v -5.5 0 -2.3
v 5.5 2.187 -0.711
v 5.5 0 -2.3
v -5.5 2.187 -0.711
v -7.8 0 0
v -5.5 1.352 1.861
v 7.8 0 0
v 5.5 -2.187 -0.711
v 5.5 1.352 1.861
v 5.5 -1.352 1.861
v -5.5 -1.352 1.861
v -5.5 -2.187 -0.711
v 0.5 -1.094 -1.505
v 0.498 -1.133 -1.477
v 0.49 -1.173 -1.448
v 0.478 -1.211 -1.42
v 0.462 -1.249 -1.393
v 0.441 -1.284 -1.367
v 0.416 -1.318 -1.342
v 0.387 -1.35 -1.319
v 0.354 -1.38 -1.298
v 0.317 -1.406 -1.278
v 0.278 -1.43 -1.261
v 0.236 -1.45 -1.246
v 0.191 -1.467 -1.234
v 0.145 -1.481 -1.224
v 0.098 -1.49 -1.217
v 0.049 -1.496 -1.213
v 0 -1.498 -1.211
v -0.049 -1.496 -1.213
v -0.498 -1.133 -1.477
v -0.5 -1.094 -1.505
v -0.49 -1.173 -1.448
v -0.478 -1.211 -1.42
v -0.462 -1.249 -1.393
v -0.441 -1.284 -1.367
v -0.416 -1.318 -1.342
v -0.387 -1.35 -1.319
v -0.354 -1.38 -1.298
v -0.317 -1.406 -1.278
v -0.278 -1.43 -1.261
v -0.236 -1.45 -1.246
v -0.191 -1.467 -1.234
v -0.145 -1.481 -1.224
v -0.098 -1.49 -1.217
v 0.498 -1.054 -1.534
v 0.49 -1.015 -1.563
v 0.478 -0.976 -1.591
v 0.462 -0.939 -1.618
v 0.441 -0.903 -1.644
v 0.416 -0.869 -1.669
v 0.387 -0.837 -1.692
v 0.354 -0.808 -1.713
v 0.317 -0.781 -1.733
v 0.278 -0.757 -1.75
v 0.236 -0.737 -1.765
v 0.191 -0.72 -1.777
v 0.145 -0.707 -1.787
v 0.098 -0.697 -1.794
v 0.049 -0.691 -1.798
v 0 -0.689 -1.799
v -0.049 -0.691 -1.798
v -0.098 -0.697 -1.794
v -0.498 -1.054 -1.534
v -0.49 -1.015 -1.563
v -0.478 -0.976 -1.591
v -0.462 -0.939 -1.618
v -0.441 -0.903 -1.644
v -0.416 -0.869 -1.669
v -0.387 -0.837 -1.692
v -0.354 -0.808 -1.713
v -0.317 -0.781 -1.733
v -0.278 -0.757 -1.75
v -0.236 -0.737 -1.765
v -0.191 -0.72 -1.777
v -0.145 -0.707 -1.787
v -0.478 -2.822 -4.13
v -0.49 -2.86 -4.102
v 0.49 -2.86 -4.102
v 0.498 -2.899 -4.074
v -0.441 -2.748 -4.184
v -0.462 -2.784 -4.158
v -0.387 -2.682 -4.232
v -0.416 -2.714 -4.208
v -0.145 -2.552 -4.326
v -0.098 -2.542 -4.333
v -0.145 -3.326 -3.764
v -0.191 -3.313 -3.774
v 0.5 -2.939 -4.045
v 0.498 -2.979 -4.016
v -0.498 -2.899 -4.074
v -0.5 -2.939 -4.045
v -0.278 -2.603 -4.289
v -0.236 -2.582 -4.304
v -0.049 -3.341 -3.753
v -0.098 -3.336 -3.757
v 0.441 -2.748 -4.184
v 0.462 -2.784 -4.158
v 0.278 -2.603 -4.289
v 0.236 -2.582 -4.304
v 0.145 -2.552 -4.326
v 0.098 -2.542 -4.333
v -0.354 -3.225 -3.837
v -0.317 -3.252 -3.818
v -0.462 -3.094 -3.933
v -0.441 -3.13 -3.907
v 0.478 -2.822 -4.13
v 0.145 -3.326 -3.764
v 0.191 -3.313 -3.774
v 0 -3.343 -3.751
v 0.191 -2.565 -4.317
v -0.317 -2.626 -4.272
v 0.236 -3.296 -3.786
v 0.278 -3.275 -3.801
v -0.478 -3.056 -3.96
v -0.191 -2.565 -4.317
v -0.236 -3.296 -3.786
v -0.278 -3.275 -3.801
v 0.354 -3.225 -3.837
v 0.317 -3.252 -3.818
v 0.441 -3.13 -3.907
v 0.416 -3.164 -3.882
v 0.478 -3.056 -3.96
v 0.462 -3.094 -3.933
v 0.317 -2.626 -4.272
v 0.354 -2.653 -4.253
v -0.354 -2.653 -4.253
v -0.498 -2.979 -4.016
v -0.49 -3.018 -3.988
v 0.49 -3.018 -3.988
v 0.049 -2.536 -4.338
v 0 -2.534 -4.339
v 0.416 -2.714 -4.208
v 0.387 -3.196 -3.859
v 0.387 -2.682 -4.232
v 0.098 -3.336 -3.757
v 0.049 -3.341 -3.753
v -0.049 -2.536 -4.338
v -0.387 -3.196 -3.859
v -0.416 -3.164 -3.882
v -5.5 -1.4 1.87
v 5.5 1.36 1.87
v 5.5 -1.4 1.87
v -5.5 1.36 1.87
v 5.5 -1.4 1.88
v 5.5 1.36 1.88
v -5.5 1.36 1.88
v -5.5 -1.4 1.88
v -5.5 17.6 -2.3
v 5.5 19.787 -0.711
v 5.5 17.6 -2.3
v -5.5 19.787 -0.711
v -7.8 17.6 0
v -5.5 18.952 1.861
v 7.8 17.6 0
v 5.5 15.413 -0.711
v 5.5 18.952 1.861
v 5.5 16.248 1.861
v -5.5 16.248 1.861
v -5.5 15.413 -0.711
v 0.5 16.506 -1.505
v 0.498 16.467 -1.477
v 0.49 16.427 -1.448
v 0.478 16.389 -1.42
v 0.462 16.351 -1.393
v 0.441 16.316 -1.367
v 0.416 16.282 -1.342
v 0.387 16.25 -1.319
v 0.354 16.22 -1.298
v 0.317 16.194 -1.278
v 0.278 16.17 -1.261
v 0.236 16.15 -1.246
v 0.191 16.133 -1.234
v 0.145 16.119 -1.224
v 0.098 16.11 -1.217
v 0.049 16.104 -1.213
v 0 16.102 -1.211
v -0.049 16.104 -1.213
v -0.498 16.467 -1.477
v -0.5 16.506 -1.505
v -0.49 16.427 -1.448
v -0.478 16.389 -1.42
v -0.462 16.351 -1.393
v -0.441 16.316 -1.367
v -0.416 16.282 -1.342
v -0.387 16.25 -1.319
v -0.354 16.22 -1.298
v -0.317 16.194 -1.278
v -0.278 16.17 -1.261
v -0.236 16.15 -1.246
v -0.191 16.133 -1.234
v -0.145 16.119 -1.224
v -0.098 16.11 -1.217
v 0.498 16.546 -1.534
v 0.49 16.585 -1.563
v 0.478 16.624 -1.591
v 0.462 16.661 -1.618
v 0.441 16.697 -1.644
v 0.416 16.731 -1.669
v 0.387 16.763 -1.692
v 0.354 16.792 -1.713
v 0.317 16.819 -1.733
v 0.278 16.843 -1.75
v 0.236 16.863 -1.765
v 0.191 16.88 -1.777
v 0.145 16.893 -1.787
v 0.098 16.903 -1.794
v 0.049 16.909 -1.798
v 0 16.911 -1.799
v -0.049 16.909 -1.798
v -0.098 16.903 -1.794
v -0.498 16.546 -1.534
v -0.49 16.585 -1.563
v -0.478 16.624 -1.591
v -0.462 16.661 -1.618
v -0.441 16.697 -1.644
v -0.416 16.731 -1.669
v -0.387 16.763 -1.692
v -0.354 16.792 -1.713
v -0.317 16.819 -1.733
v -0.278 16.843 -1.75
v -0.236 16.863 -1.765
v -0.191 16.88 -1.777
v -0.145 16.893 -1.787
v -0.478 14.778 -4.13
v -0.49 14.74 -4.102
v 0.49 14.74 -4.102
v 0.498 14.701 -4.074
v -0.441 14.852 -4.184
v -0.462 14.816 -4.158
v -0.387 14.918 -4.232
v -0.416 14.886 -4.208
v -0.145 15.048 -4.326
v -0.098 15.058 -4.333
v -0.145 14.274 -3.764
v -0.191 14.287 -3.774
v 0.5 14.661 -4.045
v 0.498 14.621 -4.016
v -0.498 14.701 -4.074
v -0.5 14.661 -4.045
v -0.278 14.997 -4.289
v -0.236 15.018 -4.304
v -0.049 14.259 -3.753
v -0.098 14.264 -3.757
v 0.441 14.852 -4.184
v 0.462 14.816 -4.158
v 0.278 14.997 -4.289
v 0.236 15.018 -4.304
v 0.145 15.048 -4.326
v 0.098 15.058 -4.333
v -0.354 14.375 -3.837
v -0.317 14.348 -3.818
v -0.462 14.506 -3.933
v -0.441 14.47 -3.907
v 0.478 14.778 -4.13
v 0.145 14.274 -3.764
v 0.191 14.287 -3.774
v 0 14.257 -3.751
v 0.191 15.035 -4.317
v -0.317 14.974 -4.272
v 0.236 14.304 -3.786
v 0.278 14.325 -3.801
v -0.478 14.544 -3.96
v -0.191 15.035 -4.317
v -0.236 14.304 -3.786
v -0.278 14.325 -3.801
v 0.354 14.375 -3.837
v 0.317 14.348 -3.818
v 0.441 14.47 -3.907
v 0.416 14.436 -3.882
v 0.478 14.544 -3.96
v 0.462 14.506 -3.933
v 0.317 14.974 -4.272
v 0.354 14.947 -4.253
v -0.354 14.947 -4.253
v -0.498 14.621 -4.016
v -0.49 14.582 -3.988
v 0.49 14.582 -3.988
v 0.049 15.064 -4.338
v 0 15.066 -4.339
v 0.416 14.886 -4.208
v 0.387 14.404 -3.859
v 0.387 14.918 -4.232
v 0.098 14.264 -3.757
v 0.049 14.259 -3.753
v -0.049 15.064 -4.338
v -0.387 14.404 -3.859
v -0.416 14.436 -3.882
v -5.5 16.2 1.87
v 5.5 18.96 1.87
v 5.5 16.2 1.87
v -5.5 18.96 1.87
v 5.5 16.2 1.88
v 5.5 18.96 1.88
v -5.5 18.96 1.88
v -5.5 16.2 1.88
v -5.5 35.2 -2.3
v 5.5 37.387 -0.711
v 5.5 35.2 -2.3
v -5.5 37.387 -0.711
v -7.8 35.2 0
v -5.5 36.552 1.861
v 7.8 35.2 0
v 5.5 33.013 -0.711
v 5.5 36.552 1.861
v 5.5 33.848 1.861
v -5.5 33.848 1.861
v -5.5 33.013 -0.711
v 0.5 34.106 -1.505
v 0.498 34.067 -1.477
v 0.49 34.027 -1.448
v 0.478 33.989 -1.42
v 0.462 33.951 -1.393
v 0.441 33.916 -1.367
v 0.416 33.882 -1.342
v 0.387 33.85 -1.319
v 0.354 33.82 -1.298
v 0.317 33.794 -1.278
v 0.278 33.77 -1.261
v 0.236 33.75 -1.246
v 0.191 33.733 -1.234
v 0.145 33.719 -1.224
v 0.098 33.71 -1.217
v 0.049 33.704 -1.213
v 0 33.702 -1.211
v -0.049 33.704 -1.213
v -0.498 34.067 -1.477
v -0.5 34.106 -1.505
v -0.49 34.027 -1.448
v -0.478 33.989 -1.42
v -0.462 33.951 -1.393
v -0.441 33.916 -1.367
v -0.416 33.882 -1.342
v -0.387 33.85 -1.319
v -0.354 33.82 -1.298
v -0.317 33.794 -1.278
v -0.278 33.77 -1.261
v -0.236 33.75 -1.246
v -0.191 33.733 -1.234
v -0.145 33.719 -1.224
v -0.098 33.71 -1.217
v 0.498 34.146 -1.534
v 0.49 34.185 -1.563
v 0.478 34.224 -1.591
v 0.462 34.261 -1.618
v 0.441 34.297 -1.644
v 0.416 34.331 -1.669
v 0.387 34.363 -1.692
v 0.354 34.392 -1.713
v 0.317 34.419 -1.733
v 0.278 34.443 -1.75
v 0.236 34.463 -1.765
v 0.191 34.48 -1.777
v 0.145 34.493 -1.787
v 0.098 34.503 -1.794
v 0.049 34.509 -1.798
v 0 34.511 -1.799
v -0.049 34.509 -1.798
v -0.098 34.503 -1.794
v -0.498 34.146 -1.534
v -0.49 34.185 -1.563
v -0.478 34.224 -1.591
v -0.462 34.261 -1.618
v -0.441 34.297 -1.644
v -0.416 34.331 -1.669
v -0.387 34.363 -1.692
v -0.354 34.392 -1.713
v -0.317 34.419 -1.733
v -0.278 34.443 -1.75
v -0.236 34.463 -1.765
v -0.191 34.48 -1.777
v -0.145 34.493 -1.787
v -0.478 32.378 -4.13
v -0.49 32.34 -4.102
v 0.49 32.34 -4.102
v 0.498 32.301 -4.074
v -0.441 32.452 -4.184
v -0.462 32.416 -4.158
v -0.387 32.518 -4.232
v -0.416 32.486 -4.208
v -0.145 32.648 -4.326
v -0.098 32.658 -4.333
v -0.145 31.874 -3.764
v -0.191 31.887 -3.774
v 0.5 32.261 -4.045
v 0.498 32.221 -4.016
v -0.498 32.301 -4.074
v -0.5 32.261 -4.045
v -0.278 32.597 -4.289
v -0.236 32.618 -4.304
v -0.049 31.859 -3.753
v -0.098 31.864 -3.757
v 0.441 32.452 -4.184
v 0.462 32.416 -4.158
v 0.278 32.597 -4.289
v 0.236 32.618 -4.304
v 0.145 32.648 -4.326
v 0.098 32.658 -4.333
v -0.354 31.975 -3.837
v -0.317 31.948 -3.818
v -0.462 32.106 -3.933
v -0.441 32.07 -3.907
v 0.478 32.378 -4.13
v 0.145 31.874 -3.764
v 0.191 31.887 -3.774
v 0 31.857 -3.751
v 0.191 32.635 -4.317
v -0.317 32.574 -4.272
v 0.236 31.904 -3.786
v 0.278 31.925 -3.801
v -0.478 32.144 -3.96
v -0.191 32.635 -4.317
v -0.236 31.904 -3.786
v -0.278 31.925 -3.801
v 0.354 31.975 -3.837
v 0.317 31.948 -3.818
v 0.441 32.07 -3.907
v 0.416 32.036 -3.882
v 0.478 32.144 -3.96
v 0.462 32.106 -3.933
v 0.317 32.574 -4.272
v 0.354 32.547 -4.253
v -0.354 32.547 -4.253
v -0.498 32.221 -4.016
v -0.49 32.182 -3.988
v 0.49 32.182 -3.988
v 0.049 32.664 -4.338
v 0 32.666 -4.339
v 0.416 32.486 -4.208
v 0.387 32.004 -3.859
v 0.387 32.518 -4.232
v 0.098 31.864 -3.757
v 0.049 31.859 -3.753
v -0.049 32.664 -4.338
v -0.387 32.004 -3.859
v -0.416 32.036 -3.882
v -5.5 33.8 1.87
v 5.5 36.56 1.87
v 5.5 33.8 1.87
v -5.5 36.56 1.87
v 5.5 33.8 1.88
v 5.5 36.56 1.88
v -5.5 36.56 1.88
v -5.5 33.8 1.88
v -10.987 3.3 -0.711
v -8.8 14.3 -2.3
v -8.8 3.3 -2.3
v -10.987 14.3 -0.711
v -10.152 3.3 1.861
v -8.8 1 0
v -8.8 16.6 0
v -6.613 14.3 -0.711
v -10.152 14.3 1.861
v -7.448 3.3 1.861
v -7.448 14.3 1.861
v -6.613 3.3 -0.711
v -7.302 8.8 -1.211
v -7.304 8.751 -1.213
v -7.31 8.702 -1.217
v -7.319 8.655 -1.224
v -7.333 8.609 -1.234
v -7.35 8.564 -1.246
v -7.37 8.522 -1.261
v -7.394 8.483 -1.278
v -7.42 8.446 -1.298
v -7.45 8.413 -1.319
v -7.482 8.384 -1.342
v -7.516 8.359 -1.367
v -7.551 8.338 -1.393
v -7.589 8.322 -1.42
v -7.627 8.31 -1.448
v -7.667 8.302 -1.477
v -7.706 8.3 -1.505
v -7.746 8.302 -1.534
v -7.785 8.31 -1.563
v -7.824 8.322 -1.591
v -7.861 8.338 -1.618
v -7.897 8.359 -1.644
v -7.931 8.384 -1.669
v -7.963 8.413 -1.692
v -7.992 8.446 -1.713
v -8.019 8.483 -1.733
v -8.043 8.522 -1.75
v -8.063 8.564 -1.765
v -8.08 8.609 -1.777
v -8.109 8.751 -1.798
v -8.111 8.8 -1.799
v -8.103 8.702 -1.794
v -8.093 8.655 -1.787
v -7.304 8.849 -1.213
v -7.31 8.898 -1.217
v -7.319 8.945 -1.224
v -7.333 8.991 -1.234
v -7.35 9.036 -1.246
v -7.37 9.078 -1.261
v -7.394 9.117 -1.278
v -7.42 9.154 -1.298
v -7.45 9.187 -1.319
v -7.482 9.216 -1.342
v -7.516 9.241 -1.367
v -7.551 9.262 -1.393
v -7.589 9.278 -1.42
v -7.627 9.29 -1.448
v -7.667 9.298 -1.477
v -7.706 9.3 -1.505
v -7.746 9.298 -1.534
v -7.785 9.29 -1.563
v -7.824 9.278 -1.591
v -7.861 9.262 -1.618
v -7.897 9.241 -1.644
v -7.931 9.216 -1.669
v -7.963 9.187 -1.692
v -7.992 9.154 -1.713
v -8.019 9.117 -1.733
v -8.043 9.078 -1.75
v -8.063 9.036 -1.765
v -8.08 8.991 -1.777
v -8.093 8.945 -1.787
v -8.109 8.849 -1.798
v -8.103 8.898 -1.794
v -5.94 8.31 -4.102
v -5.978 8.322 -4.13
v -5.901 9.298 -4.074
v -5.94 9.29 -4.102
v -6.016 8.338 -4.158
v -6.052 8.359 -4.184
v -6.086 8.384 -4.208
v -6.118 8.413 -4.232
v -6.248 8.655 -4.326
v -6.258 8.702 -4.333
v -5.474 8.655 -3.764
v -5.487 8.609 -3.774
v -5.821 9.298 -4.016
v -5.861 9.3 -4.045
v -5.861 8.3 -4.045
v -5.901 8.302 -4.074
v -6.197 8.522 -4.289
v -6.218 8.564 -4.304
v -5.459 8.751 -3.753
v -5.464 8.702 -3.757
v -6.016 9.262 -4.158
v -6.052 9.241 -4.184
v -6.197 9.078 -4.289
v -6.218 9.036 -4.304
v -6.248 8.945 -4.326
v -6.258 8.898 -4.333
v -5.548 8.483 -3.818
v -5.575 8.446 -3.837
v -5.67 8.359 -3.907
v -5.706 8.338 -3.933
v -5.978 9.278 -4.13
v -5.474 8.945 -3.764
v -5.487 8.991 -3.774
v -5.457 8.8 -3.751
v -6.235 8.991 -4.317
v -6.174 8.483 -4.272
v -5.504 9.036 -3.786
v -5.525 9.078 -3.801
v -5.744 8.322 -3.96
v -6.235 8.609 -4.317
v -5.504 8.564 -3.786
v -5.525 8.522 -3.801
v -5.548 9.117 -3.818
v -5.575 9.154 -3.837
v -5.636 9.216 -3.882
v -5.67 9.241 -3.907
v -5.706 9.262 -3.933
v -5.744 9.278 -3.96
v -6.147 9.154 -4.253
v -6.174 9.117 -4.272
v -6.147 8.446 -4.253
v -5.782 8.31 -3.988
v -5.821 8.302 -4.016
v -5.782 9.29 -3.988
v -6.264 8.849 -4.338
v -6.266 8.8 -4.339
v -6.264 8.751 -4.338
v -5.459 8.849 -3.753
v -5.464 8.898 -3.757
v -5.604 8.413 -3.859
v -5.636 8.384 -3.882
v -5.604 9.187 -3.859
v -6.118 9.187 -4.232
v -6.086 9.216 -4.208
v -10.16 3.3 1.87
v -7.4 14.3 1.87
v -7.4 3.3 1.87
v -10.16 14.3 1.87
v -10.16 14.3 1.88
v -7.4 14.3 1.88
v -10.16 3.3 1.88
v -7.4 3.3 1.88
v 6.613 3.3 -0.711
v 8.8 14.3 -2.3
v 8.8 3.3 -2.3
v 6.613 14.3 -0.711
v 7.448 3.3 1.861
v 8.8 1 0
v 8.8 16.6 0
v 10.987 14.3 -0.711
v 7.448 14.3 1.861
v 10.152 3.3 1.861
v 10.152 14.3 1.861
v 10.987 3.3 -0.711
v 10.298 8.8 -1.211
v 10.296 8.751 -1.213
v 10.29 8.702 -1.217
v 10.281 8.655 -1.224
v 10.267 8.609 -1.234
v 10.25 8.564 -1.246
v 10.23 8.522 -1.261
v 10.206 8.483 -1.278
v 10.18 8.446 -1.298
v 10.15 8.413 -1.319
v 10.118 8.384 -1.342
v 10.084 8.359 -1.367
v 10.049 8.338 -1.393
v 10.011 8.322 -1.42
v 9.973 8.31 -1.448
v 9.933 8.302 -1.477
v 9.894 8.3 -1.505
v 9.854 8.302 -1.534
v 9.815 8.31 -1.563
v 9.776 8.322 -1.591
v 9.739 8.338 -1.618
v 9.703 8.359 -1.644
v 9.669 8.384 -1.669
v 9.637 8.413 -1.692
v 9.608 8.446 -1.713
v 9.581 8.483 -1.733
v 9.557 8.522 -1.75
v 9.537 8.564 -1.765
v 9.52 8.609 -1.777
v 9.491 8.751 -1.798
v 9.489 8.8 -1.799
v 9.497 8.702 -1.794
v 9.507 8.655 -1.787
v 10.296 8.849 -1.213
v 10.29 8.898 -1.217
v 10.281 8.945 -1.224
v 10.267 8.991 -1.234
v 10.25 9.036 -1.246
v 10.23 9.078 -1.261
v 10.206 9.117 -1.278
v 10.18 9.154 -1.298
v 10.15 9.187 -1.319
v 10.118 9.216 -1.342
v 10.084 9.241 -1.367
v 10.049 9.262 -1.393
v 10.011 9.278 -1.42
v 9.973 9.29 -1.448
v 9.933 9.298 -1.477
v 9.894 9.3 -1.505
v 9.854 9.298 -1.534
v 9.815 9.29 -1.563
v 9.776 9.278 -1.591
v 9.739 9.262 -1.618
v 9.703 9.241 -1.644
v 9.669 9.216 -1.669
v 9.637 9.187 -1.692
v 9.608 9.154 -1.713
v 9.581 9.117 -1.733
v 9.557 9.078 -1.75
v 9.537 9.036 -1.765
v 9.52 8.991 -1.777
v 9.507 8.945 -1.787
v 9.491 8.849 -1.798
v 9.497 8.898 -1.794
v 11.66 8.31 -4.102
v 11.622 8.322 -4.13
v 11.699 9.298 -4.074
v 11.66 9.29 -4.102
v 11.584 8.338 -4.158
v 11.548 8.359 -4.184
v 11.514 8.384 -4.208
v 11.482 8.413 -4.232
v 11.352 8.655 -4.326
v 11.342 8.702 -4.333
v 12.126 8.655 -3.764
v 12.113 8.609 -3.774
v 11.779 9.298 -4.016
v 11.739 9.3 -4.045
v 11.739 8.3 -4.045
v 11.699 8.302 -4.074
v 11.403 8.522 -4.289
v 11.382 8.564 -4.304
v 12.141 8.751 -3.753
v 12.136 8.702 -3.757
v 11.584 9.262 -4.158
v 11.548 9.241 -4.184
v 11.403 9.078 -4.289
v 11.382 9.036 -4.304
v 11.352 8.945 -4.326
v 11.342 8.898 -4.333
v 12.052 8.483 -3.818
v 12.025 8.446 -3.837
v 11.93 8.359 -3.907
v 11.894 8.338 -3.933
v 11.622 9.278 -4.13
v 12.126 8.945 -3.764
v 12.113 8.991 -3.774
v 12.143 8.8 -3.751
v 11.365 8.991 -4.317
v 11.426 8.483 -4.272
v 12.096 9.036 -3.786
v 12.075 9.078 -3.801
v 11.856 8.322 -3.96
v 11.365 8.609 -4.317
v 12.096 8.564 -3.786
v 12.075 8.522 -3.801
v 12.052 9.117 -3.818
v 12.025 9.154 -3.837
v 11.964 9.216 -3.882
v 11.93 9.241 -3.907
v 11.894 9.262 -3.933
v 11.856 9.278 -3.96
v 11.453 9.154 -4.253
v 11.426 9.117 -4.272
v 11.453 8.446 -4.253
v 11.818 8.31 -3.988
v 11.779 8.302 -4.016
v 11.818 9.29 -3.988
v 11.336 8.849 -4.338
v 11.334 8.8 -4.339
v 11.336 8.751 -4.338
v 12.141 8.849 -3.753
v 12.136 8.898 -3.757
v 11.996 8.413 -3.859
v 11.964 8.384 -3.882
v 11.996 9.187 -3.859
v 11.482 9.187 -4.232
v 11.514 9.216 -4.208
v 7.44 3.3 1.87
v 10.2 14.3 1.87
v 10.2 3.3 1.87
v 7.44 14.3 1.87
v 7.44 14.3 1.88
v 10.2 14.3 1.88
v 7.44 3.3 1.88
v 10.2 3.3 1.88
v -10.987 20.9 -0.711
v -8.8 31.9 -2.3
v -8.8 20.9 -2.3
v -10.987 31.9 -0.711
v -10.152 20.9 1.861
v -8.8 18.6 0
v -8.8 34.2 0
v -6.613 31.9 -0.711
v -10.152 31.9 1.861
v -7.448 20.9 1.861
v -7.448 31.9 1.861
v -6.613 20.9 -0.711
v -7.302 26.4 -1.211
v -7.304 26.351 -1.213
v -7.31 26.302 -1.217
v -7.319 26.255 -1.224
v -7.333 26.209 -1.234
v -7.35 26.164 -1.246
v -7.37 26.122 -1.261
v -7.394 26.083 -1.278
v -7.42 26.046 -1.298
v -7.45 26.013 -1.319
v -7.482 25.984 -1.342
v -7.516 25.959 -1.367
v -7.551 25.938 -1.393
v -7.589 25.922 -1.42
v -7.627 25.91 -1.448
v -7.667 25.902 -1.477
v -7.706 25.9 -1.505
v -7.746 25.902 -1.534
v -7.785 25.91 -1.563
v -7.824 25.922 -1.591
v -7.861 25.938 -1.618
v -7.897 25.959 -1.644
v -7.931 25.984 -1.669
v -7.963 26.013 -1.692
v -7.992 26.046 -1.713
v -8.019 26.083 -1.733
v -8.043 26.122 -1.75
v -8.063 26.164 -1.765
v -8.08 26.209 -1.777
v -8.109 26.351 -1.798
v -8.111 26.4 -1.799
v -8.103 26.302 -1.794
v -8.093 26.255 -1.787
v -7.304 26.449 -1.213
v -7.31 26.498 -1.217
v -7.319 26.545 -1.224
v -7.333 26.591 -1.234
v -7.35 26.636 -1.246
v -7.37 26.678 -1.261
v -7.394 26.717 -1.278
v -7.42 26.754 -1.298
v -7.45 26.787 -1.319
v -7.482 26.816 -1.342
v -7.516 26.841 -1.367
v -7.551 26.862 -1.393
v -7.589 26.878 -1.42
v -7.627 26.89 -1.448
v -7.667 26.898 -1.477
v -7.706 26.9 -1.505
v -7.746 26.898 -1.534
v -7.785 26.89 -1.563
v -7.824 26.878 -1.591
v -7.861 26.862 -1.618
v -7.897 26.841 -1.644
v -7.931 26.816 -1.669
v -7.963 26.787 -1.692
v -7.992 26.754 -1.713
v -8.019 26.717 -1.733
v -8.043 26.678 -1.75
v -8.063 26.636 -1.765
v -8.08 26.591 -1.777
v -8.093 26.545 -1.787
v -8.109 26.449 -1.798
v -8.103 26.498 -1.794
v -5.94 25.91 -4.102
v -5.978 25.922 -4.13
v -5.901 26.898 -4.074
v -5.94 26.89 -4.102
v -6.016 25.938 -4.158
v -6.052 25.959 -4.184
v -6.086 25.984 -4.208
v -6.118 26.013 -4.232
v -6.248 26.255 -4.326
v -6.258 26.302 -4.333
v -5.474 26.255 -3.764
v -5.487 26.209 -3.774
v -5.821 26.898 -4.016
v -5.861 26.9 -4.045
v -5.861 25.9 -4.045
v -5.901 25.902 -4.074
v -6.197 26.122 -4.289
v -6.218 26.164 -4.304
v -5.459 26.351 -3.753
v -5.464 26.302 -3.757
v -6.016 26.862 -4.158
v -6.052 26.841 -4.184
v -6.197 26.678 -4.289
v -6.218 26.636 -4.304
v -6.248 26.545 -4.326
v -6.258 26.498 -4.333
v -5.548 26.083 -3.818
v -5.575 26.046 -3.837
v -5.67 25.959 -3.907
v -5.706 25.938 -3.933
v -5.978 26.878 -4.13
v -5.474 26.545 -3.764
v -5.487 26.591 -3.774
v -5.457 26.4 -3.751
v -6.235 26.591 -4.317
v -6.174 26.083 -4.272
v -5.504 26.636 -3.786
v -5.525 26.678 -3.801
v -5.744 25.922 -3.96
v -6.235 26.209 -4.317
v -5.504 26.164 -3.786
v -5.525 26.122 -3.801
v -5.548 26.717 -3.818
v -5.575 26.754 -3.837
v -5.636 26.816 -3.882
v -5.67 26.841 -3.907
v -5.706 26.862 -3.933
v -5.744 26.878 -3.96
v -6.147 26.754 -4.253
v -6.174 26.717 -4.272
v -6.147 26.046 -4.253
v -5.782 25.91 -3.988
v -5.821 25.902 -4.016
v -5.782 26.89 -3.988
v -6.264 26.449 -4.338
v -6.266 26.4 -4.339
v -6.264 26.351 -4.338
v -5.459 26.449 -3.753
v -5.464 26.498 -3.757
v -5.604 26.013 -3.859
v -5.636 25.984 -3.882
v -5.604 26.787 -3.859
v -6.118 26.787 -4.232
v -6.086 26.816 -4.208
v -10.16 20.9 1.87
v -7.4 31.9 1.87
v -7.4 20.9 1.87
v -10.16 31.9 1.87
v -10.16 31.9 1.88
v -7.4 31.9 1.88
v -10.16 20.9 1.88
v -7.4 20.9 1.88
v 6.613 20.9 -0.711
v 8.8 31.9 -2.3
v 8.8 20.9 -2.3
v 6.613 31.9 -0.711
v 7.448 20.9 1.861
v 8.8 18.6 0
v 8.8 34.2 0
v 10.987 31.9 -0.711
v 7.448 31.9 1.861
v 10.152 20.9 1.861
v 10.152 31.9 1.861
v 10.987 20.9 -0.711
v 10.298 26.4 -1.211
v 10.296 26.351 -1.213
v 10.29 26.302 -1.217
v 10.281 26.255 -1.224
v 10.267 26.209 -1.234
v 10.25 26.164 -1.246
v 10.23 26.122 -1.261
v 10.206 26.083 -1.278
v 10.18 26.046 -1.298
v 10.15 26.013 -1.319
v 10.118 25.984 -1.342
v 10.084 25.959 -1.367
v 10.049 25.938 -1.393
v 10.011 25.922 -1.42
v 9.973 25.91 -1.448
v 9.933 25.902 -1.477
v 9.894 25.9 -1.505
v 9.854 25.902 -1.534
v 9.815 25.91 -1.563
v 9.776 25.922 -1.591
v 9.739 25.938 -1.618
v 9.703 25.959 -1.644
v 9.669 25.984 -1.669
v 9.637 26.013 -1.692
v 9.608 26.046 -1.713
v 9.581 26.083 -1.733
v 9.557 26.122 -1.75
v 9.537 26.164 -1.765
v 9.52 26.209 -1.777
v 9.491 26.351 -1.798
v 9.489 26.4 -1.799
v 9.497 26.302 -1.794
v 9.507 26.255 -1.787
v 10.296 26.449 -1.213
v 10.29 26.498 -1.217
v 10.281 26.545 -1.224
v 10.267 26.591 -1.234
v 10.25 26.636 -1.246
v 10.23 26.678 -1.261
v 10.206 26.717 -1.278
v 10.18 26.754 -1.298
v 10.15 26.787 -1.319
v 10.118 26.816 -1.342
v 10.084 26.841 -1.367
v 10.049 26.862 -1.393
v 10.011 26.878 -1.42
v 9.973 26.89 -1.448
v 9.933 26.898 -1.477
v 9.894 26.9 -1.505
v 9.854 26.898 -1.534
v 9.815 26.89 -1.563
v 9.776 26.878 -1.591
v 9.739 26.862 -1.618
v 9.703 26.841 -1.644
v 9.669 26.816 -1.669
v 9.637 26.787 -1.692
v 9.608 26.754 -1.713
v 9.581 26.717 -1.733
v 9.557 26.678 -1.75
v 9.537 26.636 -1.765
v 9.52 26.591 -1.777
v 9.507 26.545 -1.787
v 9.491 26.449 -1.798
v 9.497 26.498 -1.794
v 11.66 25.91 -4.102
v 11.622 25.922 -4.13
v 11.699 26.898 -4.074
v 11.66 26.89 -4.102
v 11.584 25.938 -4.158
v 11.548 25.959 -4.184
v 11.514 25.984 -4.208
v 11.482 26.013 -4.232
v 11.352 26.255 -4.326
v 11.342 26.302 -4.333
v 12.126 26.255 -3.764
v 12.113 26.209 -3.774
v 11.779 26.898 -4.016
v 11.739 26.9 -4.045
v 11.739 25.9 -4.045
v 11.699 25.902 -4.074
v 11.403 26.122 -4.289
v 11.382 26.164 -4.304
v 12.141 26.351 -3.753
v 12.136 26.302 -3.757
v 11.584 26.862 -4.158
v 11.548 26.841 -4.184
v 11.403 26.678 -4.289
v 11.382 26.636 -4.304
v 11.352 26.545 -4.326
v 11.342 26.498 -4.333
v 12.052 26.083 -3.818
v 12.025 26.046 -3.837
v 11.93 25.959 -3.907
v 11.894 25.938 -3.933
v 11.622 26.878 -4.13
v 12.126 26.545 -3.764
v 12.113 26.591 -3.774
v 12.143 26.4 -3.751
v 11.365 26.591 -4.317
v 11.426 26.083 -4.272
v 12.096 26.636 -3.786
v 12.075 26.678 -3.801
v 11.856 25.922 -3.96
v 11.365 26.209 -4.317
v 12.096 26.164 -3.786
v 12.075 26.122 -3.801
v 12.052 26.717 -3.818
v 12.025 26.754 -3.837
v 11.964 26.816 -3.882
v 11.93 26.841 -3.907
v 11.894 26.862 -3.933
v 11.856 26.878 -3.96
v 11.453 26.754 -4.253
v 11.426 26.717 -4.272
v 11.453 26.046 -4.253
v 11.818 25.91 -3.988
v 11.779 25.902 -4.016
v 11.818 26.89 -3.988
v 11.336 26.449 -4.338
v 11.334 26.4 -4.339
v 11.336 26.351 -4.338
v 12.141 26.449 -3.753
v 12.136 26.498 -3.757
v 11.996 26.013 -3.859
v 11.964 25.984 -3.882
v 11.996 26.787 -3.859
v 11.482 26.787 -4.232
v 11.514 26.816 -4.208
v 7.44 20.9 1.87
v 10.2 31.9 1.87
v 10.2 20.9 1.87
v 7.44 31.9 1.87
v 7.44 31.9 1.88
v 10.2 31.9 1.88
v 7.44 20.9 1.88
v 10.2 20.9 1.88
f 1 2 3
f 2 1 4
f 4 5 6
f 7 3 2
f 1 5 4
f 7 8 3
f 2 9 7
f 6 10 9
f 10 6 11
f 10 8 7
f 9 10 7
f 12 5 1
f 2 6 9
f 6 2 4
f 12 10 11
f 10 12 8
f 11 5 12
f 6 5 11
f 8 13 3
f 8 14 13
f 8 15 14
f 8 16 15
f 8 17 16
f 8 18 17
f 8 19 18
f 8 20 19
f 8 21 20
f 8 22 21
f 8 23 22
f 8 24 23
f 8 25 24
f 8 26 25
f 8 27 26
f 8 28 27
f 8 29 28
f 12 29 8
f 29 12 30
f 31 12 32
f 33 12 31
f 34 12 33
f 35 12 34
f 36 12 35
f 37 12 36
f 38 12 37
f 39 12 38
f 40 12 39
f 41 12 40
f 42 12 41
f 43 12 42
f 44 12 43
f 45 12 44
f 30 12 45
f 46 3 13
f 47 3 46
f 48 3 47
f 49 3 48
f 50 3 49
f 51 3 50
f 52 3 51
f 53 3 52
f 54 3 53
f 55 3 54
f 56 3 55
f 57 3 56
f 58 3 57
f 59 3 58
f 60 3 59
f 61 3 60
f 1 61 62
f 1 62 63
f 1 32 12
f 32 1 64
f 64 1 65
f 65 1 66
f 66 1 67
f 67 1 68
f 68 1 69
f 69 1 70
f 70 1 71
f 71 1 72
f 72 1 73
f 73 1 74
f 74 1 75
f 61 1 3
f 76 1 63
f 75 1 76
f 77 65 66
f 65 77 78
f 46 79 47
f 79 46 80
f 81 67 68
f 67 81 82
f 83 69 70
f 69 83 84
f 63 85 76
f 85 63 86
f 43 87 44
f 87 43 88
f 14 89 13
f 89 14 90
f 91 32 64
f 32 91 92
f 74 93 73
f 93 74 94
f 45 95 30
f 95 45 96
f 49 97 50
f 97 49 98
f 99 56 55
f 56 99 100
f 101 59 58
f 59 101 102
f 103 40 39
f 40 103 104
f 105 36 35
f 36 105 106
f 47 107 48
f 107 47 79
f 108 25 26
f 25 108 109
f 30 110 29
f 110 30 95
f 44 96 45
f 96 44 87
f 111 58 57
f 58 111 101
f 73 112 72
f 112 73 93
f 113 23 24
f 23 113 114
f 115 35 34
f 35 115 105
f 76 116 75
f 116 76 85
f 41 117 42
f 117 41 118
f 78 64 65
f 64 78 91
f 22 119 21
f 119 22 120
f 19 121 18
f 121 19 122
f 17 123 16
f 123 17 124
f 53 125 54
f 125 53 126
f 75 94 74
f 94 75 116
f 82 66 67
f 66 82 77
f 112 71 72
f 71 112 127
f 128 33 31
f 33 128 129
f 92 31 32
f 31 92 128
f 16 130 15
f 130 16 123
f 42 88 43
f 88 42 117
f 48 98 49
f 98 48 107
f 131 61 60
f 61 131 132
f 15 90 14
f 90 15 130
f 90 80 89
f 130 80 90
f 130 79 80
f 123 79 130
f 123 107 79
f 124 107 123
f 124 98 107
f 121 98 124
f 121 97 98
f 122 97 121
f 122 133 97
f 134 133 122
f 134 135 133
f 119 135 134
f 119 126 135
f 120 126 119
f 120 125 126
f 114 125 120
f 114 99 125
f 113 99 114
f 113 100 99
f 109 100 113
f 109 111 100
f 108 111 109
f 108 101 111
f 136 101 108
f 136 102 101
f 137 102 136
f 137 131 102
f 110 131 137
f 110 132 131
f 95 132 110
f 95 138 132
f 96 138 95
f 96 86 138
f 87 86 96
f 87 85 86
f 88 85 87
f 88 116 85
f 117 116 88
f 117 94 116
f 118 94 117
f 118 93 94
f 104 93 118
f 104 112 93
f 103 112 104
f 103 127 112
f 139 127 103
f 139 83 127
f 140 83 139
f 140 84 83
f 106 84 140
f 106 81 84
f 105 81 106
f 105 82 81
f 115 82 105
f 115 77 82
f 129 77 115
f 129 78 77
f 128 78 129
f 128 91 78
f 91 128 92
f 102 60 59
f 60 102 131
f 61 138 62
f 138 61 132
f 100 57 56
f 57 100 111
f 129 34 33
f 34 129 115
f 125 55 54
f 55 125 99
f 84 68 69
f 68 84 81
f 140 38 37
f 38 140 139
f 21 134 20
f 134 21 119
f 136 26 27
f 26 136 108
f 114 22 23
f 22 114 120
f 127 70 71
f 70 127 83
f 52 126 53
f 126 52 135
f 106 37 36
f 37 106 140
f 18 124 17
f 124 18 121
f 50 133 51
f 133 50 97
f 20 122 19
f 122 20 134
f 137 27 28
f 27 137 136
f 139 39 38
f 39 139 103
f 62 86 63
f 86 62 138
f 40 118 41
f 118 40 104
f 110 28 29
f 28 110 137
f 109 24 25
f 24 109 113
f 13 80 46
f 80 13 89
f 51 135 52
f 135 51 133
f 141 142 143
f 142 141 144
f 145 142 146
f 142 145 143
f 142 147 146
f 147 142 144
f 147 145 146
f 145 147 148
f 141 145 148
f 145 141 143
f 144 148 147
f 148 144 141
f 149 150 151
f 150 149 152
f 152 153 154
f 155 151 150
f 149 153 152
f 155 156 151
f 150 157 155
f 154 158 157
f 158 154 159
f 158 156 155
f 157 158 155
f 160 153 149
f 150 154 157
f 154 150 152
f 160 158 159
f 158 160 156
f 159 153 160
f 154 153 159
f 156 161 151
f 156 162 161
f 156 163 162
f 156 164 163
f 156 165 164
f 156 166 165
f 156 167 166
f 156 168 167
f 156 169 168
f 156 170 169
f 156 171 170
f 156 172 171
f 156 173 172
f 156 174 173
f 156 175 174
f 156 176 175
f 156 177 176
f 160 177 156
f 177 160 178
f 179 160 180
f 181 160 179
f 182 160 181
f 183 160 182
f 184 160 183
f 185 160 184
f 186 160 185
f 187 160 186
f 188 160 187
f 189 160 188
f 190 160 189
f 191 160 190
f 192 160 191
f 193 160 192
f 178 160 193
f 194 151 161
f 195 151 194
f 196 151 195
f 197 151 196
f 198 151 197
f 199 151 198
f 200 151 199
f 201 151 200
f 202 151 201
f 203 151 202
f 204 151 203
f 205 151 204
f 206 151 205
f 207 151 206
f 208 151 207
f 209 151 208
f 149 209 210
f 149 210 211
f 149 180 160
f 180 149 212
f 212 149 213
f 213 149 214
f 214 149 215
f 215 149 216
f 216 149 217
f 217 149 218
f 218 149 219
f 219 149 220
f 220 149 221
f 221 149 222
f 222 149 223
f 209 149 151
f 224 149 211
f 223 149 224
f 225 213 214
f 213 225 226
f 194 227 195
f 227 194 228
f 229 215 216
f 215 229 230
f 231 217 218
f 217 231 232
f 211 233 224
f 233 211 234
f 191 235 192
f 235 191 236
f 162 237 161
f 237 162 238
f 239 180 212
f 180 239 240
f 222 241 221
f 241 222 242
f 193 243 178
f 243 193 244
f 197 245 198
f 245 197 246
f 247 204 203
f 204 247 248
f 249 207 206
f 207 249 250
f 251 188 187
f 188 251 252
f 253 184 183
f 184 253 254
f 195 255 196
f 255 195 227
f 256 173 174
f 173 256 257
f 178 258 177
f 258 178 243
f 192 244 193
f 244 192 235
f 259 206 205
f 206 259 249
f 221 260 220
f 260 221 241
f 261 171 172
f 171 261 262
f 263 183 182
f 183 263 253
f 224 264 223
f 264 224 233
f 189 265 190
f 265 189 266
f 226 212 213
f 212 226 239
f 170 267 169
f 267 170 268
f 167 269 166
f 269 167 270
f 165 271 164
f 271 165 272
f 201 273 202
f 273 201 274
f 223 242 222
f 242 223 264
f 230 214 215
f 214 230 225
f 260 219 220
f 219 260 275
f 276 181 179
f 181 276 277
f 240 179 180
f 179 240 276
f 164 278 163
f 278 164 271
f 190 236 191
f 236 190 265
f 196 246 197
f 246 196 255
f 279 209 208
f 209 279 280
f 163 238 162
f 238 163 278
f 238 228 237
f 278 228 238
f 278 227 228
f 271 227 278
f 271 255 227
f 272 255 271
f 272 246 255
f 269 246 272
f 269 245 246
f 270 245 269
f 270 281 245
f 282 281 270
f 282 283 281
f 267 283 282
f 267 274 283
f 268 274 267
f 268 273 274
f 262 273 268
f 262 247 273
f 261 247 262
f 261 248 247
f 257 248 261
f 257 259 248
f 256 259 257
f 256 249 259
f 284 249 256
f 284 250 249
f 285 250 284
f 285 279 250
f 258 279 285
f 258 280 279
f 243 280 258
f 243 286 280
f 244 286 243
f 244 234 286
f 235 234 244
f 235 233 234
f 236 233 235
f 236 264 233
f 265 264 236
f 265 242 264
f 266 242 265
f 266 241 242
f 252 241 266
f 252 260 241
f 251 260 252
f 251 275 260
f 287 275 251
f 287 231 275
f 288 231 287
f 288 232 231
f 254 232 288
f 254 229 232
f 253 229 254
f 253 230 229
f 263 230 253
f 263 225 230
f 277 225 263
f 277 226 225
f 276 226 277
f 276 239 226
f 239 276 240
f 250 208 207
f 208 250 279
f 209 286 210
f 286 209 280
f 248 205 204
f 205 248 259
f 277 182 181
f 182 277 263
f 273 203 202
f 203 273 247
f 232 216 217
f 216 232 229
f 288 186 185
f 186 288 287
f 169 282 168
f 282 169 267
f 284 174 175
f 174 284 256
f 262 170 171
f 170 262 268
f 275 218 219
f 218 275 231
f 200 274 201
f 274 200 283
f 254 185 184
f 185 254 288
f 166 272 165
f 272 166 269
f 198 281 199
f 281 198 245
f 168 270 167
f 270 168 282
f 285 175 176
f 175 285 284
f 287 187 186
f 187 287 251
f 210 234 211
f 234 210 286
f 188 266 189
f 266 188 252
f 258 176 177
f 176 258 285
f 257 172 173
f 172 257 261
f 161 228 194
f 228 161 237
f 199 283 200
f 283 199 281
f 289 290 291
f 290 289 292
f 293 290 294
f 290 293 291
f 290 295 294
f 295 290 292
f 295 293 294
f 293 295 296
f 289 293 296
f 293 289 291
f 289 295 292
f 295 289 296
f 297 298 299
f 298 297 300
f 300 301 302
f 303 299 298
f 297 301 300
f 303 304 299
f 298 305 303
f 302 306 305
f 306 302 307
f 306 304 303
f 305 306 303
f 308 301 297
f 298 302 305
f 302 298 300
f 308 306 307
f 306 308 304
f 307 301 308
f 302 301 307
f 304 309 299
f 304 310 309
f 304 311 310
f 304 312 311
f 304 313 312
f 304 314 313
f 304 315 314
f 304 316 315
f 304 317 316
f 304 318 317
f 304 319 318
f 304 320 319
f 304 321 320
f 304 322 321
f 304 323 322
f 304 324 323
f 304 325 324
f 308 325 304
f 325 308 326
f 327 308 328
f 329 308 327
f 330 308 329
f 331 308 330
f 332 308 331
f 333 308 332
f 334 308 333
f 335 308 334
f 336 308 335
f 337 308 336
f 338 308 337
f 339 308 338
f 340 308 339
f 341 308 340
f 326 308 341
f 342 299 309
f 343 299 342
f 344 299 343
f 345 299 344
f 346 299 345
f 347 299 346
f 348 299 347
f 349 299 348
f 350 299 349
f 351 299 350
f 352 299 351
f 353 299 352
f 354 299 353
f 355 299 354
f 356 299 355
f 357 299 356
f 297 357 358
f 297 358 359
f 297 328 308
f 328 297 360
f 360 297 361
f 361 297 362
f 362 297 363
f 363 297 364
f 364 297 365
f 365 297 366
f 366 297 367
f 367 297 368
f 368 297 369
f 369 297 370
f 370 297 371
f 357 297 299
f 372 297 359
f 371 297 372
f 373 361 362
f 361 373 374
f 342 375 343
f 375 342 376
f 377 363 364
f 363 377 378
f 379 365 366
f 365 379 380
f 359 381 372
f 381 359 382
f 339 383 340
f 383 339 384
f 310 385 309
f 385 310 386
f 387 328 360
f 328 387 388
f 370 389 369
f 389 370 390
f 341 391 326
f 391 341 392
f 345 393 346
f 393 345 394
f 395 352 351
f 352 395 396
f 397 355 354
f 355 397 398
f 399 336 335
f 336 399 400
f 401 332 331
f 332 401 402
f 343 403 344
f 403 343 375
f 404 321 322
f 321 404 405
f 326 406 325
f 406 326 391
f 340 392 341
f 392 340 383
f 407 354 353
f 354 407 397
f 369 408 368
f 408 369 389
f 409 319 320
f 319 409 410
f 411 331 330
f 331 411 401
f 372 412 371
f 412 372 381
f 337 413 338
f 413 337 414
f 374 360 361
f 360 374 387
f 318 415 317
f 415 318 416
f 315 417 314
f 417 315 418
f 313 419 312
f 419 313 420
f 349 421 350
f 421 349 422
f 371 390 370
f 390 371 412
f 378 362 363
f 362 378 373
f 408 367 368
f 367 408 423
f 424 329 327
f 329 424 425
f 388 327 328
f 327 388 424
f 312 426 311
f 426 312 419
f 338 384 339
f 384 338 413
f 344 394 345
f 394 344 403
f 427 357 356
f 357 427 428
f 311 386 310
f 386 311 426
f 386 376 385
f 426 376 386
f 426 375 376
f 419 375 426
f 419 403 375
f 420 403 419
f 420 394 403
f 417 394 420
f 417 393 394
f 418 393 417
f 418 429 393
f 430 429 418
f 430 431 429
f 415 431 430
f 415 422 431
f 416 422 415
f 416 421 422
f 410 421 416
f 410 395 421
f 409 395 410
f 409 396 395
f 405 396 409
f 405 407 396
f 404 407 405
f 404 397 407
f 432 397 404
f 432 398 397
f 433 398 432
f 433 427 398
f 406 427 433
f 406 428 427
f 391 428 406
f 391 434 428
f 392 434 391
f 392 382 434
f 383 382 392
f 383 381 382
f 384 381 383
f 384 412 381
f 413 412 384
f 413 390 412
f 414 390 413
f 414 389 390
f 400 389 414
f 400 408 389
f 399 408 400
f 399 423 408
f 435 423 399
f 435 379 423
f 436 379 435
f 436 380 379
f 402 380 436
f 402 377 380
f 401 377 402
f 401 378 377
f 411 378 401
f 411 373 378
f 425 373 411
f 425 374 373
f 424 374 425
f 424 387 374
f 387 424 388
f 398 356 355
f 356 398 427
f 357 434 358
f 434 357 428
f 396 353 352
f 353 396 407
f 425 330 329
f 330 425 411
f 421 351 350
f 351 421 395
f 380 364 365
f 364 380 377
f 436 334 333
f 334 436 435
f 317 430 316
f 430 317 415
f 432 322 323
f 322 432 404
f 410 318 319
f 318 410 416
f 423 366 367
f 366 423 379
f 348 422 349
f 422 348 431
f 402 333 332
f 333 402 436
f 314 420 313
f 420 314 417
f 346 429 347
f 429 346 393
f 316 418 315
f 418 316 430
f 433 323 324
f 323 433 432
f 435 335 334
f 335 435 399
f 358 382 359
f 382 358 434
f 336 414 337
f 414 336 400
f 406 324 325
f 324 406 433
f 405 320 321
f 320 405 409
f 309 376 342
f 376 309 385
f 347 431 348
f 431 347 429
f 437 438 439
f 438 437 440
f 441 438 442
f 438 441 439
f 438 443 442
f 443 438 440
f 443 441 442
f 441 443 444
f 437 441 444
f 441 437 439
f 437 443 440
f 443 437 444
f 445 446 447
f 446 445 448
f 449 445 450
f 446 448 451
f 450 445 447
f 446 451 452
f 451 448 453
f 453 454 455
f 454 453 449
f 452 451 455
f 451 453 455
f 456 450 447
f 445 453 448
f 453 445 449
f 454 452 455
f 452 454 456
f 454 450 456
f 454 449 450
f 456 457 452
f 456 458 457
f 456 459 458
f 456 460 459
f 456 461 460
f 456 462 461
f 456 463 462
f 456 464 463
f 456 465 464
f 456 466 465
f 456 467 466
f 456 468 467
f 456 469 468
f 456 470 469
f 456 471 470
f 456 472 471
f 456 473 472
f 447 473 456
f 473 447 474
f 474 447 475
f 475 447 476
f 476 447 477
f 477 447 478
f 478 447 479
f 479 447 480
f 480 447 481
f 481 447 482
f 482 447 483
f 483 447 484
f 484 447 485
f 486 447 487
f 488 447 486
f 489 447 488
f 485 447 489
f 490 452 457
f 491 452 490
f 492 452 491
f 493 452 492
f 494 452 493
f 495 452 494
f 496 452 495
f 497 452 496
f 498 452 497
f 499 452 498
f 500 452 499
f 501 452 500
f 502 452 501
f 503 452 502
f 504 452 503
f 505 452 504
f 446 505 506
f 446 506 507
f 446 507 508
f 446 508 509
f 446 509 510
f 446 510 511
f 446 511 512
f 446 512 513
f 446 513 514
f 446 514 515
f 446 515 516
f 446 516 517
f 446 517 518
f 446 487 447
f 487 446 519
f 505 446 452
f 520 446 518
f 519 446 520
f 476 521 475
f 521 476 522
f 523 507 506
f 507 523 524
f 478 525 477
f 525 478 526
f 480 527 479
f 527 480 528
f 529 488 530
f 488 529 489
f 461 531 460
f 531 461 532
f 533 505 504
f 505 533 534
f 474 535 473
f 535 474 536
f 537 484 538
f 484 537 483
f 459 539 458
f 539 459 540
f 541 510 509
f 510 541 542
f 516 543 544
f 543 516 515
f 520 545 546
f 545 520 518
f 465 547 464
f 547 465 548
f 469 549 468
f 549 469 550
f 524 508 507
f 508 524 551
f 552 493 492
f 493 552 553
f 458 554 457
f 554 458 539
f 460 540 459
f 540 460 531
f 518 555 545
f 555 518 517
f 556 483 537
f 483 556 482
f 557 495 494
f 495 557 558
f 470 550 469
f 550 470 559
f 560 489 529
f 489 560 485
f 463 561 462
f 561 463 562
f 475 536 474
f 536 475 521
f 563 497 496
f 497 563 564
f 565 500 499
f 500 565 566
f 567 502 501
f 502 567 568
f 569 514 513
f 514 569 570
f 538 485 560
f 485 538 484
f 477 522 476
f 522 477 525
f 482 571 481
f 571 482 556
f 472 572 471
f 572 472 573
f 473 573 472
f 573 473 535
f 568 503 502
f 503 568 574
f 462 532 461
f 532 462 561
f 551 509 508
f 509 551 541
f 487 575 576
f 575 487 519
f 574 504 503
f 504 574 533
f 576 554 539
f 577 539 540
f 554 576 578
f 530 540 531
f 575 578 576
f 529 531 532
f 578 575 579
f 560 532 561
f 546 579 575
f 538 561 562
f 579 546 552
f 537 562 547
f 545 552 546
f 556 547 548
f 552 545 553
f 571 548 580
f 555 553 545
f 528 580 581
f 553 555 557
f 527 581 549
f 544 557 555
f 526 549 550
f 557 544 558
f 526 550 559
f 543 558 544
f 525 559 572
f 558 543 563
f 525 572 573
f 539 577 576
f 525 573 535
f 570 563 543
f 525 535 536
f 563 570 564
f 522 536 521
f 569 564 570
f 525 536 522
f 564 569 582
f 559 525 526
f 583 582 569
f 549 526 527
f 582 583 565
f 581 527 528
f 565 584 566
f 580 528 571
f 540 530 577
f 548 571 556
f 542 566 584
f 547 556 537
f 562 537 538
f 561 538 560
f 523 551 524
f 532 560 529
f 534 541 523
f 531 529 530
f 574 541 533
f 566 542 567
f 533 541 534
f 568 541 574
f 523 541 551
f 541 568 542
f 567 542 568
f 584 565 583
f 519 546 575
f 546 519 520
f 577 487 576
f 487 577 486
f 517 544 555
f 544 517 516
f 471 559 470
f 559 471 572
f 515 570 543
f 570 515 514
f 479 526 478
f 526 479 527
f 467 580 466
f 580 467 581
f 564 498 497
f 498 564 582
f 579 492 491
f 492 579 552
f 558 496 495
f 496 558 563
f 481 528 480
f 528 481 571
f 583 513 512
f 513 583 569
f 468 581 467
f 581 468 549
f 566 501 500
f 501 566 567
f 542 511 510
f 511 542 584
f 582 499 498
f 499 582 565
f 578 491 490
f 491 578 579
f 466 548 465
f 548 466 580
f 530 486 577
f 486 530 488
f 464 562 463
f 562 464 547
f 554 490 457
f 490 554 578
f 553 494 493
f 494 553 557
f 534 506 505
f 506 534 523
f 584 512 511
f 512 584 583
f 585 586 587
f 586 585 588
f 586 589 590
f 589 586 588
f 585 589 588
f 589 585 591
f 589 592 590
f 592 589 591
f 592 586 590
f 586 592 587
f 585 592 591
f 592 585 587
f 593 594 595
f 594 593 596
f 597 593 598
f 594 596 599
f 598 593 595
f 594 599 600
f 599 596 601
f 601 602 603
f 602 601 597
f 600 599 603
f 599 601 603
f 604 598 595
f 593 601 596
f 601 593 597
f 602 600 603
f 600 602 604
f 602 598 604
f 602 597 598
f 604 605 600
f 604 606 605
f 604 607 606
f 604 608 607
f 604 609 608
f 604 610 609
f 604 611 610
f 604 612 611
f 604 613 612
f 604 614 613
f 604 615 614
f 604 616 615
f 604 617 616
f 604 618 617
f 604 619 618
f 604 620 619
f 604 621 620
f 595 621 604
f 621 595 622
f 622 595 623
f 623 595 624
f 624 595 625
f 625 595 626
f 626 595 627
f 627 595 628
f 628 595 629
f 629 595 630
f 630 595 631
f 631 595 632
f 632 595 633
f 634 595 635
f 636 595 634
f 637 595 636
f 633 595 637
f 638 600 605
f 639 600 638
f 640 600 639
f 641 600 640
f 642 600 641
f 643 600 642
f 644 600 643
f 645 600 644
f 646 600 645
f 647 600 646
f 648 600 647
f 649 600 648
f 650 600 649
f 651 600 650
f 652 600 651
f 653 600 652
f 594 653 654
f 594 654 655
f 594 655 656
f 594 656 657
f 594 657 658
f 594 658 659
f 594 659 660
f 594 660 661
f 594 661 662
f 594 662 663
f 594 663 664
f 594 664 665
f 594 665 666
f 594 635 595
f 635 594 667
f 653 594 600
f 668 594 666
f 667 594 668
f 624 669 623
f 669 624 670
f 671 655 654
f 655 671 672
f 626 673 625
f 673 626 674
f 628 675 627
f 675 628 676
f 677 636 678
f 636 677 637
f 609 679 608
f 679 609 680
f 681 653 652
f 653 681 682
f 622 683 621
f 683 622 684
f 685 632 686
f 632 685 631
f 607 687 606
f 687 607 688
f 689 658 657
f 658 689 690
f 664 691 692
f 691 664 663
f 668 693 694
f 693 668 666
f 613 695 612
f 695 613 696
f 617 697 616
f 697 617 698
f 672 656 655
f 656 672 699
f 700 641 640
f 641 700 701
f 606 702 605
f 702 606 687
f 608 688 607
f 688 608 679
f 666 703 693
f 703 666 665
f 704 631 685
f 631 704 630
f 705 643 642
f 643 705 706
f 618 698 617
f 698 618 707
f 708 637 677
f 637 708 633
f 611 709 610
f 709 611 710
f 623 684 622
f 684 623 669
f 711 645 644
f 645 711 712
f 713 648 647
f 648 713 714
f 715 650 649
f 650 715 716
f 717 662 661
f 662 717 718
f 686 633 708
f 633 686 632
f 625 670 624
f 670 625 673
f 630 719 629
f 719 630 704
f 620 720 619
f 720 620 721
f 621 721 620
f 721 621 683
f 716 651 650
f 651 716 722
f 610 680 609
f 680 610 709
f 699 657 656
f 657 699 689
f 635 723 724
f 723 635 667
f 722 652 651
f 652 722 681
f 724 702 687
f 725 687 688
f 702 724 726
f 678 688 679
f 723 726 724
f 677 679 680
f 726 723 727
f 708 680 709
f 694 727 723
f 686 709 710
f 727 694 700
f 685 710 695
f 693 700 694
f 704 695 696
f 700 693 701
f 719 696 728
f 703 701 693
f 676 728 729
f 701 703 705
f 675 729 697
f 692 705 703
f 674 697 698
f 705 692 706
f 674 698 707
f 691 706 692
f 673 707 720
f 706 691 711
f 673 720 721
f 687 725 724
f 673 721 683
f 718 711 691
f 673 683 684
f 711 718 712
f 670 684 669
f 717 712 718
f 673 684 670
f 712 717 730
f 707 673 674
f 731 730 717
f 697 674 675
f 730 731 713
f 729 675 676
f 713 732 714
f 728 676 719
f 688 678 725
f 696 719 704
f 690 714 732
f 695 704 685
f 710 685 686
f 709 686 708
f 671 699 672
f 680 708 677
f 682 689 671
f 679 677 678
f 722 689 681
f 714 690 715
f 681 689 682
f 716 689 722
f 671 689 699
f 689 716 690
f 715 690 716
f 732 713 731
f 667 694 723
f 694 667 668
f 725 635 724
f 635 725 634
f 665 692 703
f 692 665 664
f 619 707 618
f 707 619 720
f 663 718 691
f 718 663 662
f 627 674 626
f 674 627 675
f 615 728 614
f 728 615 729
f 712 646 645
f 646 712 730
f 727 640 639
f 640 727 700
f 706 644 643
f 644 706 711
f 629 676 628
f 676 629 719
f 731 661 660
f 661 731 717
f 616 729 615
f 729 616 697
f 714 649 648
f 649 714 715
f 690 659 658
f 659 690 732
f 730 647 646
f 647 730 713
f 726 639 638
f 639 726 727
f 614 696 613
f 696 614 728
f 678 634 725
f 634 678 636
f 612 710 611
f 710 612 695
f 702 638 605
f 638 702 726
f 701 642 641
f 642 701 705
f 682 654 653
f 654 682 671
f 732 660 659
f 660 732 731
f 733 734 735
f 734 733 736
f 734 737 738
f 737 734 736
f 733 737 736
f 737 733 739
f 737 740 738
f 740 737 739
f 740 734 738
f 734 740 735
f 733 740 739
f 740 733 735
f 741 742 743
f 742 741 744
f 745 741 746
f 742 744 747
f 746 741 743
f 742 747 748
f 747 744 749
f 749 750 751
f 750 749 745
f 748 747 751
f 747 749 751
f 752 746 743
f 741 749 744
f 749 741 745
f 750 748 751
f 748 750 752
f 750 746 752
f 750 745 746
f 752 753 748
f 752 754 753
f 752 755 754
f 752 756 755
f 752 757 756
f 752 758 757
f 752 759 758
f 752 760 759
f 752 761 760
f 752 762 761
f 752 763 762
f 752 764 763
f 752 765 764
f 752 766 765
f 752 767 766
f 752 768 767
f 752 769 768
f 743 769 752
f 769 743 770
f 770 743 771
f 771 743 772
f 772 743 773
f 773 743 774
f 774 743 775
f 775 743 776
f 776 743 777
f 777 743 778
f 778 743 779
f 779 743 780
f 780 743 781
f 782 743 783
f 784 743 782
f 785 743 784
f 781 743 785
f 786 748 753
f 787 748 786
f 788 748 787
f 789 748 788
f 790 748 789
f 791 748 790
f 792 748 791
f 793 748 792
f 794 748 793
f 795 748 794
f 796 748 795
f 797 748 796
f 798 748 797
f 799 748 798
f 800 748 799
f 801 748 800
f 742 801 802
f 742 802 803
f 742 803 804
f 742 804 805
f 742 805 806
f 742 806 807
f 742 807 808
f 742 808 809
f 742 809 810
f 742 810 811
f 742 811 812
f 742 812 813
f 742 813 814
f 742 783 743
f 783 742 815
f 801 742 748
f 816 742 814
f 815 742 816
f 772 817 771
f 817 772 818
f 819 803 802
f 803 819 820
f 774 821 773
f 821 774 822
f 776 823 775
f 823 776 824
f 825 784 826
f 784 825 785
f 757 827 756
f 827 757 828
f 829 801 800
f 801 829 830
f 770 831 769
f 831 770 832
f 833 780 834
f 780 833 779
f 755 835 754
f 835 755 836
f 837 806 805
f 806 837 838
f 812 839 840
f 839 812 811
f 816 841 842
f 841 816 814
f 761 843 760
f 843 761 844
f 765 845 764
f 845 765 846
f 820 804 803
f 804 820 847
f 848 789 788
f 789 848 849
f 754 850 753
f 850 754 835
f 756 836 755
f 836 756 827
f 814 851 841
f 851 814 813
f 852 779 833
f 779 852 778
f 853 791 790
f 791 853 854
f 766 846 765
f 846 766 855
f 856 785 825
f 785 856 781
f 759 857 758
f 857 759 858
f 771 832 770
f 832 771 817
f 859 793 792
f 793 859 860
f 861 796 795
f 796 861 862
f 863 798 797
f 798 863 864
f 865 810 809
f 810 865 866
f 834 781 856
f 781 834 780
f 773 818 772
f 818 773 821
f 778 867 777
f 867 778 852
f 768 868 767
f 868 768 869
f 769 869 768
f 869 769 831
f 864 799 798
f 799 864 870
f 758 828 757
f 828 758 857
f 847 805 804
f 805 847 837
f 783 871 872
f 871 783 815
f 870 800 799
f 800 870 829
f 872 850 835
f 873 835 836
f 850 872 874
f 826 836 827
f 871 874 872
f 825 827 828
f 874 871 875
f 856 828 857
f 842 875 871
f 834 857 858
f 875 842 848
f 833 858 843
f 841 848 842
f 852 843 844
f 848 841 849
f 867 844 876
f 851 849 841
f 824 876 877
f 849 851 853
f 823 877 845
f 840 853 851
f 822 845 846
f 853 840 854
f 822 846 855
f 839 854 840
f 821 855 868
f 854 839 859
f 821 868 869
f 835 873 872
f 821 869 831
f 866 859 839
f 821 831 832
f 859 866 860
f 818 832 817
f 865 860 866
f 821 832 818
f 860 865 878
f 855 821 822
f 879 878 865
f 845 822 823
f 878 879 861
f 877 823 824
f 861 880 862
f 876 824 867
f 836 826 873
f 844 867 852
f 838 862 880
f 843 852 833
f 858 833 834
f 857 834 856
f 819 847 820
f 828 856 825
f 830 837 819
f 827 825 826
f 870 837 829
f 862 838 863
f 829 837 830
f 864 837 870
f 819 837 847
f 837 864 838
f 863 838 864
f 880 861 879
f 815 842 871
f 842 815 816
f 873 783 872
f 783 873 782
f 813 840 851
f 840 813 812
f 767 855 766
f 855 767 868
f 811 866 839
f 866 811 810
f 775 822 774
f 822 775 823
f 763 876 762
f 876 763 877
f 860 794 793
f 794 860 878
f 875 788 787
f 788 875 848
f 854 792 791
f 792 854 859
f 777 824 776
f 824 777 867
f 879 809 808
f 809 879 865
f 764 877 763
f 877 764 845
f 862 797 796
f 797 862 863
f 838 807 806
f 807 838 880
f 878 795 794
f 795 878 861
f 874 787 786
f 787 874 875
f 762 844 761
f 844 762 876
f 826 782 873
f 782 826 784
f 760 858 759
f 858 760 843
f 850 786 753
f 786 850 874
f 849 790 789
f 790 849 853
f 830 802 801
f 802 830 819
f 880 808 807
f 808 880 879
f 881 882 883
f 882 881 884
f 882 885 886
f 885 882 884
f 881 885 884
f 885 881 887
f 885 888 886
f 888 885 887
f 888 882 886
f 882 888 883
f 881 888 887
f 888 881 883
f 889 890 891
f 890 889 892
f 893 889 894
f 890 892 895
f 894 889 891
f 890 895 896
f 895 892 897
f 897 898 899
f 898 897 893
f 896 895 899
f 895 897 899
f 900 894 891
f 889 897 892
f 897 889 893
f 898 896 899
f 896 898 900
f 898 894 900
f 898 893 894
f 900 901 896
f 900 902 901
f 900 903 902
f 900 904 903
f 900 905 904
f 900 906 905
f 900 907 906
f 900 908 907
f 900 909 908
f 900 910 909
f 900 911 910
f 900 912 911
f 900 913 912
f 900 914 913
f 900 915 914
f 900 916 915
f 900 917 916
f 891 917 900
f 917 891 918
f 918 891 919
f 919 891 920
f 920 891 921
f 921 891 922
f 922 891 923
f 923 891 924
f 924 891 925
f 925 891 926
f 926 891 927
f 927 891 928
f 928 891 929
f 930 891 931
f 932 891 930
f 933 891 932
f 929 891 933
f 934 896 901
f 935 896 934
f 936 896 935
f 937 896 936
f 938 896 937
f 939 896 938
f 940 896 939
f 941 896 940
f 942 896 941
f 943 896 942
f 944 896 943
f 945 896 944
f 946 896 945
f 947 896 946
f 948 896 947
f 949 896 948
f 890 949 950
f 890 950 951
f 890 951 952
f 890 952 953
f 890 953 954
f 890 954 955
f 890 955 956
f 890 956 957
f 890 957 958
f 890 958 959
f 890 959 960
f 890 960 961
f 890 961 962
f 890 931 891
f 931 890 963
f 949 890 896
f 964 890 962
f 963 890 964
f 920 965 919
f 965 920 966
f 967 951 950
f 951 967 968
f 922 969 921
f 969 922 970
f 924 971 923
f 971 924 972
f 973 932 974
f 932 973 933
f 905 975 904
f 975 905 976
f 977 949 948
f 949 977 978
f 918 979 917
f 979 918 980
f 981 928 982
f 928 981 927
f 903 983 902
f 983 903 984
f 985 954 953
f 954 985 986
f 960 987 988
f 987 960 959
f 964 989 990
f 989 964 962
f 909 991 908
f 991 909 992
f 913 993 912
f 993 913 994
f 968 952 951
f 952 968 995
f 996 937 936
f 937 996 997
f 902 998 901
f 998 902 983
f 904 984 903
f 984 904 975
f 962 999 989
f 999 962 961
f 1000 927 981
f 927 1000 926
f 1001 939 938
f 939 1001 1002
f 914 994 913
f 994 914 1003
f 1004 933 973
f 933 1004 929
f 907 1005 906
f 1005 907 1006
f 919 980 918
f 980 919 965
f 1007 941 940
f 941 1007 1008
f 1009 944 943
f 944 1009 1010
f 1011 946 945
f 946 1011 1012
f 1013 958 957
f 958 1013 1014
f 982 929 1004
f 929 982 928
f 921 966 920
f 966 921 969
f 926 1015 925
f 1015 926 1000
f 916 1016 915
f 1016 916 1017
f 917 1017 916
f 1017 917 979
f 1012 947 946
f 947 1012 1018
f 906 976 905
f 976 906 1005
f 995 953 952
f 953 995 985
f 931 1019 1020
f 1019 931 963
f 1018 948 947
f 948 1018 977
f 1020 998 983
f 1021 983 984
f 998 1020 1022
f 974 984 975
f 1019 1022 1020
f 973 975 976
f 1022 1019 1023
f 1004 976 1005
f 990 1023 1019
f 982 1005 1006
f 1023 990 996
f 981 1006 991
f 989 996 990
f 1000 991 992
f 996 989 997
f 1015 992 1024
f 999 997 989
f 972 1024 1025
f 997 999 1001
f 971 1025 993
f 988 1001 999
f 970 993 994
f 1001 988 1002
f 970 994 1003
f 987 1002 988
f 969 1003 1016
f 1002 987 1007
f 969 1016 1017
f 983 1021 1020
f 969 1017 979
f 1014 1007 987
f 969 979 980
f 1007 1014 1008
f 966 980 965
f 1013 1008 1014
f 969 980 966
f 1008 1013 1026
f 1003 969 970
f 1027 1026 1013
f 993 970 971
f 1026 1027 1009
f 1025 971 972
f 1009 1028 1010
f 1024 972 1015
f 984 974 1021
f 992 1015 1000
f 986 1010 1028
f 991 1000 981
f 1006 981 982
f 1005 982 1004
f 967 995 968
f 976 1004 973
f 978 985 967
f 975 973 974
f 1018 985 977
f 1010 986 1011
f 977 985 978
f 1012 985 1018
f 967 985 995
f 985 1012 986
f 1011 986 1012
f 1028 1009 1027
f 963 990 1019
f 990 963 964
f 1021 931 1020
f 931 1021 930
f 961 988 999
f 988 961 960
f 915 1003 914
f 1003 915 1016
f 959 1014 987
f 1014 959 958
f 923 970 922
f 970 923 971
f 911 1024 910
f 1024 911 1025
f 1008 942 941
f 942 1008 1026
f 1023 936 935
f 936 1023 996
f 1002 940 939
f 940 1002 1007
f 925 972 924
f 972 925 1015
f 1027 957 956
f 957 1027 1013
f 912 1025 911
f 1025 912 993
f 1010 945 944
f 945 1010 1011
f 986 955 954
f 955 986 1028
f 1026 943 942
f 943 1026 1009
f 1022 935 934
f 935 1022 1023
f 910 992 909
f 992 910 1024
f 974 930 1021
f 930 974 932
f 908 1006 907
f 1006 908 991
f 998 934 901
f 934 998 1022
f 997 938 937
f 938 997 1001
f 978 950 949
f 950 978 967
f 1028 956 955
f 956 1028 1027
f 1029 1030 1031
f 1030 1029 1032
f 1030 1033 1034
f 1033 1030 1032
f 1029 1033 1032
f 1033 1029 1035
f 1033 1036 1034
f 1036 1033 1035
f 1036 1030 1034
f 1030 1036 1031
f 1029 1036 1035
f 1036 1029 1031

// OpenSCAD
$fn=64;
e = 0.1;

seg_len = 15.6;
seg_dia = 4.6;

module polly() {
     seg_bod = seg_len-seg_dia;
     polygon( points = [ [0,0], [seg_dia/2, seg_dia/2], [seg_dia/2, seg_dia/2+seg_bod],
			 [0, seg_len], [0,0] ]);
			 
}

n = 5;
dn = 360/(n*2);

module segment_at( x, y, rot_t) {
     echo("rot_t", rot_t);
     rt= (rot_t < 0.5) ? -dn+2*rot_t*(dn*2) : -dn+2*(1-rot_t)*(dn*2);
     echo("rt=", rt);
     translate( [x-seg_len/2, y, 0]) {
	  rotate( [0, 90, 0]) {
	       rotate( [0, 0, rt]) {
		    rotate_extrude( $fn=n) polly();
		    translate( [0, 0, seg_len/2])
			 rotate( [0, 90, 0])
			 cylinder( d=1, h=5);
		    color("red")
			 rotate( [0, 90, dn])
			 translate( [-seg_len+seg_dia/2, -1.4, -1.88])
			 cube( [seg_len-seg_dia, seg_dia*.6, 0.01]);
	       }
	  }
     }
}

seg_spc = 2;
seg_pit = seg_len + seg_spc;

segment_at( 0, 0, 0);
segment_at( 0, seg_pit, 0);
segment_at( 0, 2*seg_pit, 0);
rotate( [0, 0, 90]) {
segment_at( seg_pit/2, seg_pit/2, 1);
segment_at( seg_pit/2, -seg_pit/2, 1);
segment_at( 3*seg_pit/2, seg_pit/2, 1);
segment_at( 3*seg_pit/2, -seg_pit/2, 1);
}
